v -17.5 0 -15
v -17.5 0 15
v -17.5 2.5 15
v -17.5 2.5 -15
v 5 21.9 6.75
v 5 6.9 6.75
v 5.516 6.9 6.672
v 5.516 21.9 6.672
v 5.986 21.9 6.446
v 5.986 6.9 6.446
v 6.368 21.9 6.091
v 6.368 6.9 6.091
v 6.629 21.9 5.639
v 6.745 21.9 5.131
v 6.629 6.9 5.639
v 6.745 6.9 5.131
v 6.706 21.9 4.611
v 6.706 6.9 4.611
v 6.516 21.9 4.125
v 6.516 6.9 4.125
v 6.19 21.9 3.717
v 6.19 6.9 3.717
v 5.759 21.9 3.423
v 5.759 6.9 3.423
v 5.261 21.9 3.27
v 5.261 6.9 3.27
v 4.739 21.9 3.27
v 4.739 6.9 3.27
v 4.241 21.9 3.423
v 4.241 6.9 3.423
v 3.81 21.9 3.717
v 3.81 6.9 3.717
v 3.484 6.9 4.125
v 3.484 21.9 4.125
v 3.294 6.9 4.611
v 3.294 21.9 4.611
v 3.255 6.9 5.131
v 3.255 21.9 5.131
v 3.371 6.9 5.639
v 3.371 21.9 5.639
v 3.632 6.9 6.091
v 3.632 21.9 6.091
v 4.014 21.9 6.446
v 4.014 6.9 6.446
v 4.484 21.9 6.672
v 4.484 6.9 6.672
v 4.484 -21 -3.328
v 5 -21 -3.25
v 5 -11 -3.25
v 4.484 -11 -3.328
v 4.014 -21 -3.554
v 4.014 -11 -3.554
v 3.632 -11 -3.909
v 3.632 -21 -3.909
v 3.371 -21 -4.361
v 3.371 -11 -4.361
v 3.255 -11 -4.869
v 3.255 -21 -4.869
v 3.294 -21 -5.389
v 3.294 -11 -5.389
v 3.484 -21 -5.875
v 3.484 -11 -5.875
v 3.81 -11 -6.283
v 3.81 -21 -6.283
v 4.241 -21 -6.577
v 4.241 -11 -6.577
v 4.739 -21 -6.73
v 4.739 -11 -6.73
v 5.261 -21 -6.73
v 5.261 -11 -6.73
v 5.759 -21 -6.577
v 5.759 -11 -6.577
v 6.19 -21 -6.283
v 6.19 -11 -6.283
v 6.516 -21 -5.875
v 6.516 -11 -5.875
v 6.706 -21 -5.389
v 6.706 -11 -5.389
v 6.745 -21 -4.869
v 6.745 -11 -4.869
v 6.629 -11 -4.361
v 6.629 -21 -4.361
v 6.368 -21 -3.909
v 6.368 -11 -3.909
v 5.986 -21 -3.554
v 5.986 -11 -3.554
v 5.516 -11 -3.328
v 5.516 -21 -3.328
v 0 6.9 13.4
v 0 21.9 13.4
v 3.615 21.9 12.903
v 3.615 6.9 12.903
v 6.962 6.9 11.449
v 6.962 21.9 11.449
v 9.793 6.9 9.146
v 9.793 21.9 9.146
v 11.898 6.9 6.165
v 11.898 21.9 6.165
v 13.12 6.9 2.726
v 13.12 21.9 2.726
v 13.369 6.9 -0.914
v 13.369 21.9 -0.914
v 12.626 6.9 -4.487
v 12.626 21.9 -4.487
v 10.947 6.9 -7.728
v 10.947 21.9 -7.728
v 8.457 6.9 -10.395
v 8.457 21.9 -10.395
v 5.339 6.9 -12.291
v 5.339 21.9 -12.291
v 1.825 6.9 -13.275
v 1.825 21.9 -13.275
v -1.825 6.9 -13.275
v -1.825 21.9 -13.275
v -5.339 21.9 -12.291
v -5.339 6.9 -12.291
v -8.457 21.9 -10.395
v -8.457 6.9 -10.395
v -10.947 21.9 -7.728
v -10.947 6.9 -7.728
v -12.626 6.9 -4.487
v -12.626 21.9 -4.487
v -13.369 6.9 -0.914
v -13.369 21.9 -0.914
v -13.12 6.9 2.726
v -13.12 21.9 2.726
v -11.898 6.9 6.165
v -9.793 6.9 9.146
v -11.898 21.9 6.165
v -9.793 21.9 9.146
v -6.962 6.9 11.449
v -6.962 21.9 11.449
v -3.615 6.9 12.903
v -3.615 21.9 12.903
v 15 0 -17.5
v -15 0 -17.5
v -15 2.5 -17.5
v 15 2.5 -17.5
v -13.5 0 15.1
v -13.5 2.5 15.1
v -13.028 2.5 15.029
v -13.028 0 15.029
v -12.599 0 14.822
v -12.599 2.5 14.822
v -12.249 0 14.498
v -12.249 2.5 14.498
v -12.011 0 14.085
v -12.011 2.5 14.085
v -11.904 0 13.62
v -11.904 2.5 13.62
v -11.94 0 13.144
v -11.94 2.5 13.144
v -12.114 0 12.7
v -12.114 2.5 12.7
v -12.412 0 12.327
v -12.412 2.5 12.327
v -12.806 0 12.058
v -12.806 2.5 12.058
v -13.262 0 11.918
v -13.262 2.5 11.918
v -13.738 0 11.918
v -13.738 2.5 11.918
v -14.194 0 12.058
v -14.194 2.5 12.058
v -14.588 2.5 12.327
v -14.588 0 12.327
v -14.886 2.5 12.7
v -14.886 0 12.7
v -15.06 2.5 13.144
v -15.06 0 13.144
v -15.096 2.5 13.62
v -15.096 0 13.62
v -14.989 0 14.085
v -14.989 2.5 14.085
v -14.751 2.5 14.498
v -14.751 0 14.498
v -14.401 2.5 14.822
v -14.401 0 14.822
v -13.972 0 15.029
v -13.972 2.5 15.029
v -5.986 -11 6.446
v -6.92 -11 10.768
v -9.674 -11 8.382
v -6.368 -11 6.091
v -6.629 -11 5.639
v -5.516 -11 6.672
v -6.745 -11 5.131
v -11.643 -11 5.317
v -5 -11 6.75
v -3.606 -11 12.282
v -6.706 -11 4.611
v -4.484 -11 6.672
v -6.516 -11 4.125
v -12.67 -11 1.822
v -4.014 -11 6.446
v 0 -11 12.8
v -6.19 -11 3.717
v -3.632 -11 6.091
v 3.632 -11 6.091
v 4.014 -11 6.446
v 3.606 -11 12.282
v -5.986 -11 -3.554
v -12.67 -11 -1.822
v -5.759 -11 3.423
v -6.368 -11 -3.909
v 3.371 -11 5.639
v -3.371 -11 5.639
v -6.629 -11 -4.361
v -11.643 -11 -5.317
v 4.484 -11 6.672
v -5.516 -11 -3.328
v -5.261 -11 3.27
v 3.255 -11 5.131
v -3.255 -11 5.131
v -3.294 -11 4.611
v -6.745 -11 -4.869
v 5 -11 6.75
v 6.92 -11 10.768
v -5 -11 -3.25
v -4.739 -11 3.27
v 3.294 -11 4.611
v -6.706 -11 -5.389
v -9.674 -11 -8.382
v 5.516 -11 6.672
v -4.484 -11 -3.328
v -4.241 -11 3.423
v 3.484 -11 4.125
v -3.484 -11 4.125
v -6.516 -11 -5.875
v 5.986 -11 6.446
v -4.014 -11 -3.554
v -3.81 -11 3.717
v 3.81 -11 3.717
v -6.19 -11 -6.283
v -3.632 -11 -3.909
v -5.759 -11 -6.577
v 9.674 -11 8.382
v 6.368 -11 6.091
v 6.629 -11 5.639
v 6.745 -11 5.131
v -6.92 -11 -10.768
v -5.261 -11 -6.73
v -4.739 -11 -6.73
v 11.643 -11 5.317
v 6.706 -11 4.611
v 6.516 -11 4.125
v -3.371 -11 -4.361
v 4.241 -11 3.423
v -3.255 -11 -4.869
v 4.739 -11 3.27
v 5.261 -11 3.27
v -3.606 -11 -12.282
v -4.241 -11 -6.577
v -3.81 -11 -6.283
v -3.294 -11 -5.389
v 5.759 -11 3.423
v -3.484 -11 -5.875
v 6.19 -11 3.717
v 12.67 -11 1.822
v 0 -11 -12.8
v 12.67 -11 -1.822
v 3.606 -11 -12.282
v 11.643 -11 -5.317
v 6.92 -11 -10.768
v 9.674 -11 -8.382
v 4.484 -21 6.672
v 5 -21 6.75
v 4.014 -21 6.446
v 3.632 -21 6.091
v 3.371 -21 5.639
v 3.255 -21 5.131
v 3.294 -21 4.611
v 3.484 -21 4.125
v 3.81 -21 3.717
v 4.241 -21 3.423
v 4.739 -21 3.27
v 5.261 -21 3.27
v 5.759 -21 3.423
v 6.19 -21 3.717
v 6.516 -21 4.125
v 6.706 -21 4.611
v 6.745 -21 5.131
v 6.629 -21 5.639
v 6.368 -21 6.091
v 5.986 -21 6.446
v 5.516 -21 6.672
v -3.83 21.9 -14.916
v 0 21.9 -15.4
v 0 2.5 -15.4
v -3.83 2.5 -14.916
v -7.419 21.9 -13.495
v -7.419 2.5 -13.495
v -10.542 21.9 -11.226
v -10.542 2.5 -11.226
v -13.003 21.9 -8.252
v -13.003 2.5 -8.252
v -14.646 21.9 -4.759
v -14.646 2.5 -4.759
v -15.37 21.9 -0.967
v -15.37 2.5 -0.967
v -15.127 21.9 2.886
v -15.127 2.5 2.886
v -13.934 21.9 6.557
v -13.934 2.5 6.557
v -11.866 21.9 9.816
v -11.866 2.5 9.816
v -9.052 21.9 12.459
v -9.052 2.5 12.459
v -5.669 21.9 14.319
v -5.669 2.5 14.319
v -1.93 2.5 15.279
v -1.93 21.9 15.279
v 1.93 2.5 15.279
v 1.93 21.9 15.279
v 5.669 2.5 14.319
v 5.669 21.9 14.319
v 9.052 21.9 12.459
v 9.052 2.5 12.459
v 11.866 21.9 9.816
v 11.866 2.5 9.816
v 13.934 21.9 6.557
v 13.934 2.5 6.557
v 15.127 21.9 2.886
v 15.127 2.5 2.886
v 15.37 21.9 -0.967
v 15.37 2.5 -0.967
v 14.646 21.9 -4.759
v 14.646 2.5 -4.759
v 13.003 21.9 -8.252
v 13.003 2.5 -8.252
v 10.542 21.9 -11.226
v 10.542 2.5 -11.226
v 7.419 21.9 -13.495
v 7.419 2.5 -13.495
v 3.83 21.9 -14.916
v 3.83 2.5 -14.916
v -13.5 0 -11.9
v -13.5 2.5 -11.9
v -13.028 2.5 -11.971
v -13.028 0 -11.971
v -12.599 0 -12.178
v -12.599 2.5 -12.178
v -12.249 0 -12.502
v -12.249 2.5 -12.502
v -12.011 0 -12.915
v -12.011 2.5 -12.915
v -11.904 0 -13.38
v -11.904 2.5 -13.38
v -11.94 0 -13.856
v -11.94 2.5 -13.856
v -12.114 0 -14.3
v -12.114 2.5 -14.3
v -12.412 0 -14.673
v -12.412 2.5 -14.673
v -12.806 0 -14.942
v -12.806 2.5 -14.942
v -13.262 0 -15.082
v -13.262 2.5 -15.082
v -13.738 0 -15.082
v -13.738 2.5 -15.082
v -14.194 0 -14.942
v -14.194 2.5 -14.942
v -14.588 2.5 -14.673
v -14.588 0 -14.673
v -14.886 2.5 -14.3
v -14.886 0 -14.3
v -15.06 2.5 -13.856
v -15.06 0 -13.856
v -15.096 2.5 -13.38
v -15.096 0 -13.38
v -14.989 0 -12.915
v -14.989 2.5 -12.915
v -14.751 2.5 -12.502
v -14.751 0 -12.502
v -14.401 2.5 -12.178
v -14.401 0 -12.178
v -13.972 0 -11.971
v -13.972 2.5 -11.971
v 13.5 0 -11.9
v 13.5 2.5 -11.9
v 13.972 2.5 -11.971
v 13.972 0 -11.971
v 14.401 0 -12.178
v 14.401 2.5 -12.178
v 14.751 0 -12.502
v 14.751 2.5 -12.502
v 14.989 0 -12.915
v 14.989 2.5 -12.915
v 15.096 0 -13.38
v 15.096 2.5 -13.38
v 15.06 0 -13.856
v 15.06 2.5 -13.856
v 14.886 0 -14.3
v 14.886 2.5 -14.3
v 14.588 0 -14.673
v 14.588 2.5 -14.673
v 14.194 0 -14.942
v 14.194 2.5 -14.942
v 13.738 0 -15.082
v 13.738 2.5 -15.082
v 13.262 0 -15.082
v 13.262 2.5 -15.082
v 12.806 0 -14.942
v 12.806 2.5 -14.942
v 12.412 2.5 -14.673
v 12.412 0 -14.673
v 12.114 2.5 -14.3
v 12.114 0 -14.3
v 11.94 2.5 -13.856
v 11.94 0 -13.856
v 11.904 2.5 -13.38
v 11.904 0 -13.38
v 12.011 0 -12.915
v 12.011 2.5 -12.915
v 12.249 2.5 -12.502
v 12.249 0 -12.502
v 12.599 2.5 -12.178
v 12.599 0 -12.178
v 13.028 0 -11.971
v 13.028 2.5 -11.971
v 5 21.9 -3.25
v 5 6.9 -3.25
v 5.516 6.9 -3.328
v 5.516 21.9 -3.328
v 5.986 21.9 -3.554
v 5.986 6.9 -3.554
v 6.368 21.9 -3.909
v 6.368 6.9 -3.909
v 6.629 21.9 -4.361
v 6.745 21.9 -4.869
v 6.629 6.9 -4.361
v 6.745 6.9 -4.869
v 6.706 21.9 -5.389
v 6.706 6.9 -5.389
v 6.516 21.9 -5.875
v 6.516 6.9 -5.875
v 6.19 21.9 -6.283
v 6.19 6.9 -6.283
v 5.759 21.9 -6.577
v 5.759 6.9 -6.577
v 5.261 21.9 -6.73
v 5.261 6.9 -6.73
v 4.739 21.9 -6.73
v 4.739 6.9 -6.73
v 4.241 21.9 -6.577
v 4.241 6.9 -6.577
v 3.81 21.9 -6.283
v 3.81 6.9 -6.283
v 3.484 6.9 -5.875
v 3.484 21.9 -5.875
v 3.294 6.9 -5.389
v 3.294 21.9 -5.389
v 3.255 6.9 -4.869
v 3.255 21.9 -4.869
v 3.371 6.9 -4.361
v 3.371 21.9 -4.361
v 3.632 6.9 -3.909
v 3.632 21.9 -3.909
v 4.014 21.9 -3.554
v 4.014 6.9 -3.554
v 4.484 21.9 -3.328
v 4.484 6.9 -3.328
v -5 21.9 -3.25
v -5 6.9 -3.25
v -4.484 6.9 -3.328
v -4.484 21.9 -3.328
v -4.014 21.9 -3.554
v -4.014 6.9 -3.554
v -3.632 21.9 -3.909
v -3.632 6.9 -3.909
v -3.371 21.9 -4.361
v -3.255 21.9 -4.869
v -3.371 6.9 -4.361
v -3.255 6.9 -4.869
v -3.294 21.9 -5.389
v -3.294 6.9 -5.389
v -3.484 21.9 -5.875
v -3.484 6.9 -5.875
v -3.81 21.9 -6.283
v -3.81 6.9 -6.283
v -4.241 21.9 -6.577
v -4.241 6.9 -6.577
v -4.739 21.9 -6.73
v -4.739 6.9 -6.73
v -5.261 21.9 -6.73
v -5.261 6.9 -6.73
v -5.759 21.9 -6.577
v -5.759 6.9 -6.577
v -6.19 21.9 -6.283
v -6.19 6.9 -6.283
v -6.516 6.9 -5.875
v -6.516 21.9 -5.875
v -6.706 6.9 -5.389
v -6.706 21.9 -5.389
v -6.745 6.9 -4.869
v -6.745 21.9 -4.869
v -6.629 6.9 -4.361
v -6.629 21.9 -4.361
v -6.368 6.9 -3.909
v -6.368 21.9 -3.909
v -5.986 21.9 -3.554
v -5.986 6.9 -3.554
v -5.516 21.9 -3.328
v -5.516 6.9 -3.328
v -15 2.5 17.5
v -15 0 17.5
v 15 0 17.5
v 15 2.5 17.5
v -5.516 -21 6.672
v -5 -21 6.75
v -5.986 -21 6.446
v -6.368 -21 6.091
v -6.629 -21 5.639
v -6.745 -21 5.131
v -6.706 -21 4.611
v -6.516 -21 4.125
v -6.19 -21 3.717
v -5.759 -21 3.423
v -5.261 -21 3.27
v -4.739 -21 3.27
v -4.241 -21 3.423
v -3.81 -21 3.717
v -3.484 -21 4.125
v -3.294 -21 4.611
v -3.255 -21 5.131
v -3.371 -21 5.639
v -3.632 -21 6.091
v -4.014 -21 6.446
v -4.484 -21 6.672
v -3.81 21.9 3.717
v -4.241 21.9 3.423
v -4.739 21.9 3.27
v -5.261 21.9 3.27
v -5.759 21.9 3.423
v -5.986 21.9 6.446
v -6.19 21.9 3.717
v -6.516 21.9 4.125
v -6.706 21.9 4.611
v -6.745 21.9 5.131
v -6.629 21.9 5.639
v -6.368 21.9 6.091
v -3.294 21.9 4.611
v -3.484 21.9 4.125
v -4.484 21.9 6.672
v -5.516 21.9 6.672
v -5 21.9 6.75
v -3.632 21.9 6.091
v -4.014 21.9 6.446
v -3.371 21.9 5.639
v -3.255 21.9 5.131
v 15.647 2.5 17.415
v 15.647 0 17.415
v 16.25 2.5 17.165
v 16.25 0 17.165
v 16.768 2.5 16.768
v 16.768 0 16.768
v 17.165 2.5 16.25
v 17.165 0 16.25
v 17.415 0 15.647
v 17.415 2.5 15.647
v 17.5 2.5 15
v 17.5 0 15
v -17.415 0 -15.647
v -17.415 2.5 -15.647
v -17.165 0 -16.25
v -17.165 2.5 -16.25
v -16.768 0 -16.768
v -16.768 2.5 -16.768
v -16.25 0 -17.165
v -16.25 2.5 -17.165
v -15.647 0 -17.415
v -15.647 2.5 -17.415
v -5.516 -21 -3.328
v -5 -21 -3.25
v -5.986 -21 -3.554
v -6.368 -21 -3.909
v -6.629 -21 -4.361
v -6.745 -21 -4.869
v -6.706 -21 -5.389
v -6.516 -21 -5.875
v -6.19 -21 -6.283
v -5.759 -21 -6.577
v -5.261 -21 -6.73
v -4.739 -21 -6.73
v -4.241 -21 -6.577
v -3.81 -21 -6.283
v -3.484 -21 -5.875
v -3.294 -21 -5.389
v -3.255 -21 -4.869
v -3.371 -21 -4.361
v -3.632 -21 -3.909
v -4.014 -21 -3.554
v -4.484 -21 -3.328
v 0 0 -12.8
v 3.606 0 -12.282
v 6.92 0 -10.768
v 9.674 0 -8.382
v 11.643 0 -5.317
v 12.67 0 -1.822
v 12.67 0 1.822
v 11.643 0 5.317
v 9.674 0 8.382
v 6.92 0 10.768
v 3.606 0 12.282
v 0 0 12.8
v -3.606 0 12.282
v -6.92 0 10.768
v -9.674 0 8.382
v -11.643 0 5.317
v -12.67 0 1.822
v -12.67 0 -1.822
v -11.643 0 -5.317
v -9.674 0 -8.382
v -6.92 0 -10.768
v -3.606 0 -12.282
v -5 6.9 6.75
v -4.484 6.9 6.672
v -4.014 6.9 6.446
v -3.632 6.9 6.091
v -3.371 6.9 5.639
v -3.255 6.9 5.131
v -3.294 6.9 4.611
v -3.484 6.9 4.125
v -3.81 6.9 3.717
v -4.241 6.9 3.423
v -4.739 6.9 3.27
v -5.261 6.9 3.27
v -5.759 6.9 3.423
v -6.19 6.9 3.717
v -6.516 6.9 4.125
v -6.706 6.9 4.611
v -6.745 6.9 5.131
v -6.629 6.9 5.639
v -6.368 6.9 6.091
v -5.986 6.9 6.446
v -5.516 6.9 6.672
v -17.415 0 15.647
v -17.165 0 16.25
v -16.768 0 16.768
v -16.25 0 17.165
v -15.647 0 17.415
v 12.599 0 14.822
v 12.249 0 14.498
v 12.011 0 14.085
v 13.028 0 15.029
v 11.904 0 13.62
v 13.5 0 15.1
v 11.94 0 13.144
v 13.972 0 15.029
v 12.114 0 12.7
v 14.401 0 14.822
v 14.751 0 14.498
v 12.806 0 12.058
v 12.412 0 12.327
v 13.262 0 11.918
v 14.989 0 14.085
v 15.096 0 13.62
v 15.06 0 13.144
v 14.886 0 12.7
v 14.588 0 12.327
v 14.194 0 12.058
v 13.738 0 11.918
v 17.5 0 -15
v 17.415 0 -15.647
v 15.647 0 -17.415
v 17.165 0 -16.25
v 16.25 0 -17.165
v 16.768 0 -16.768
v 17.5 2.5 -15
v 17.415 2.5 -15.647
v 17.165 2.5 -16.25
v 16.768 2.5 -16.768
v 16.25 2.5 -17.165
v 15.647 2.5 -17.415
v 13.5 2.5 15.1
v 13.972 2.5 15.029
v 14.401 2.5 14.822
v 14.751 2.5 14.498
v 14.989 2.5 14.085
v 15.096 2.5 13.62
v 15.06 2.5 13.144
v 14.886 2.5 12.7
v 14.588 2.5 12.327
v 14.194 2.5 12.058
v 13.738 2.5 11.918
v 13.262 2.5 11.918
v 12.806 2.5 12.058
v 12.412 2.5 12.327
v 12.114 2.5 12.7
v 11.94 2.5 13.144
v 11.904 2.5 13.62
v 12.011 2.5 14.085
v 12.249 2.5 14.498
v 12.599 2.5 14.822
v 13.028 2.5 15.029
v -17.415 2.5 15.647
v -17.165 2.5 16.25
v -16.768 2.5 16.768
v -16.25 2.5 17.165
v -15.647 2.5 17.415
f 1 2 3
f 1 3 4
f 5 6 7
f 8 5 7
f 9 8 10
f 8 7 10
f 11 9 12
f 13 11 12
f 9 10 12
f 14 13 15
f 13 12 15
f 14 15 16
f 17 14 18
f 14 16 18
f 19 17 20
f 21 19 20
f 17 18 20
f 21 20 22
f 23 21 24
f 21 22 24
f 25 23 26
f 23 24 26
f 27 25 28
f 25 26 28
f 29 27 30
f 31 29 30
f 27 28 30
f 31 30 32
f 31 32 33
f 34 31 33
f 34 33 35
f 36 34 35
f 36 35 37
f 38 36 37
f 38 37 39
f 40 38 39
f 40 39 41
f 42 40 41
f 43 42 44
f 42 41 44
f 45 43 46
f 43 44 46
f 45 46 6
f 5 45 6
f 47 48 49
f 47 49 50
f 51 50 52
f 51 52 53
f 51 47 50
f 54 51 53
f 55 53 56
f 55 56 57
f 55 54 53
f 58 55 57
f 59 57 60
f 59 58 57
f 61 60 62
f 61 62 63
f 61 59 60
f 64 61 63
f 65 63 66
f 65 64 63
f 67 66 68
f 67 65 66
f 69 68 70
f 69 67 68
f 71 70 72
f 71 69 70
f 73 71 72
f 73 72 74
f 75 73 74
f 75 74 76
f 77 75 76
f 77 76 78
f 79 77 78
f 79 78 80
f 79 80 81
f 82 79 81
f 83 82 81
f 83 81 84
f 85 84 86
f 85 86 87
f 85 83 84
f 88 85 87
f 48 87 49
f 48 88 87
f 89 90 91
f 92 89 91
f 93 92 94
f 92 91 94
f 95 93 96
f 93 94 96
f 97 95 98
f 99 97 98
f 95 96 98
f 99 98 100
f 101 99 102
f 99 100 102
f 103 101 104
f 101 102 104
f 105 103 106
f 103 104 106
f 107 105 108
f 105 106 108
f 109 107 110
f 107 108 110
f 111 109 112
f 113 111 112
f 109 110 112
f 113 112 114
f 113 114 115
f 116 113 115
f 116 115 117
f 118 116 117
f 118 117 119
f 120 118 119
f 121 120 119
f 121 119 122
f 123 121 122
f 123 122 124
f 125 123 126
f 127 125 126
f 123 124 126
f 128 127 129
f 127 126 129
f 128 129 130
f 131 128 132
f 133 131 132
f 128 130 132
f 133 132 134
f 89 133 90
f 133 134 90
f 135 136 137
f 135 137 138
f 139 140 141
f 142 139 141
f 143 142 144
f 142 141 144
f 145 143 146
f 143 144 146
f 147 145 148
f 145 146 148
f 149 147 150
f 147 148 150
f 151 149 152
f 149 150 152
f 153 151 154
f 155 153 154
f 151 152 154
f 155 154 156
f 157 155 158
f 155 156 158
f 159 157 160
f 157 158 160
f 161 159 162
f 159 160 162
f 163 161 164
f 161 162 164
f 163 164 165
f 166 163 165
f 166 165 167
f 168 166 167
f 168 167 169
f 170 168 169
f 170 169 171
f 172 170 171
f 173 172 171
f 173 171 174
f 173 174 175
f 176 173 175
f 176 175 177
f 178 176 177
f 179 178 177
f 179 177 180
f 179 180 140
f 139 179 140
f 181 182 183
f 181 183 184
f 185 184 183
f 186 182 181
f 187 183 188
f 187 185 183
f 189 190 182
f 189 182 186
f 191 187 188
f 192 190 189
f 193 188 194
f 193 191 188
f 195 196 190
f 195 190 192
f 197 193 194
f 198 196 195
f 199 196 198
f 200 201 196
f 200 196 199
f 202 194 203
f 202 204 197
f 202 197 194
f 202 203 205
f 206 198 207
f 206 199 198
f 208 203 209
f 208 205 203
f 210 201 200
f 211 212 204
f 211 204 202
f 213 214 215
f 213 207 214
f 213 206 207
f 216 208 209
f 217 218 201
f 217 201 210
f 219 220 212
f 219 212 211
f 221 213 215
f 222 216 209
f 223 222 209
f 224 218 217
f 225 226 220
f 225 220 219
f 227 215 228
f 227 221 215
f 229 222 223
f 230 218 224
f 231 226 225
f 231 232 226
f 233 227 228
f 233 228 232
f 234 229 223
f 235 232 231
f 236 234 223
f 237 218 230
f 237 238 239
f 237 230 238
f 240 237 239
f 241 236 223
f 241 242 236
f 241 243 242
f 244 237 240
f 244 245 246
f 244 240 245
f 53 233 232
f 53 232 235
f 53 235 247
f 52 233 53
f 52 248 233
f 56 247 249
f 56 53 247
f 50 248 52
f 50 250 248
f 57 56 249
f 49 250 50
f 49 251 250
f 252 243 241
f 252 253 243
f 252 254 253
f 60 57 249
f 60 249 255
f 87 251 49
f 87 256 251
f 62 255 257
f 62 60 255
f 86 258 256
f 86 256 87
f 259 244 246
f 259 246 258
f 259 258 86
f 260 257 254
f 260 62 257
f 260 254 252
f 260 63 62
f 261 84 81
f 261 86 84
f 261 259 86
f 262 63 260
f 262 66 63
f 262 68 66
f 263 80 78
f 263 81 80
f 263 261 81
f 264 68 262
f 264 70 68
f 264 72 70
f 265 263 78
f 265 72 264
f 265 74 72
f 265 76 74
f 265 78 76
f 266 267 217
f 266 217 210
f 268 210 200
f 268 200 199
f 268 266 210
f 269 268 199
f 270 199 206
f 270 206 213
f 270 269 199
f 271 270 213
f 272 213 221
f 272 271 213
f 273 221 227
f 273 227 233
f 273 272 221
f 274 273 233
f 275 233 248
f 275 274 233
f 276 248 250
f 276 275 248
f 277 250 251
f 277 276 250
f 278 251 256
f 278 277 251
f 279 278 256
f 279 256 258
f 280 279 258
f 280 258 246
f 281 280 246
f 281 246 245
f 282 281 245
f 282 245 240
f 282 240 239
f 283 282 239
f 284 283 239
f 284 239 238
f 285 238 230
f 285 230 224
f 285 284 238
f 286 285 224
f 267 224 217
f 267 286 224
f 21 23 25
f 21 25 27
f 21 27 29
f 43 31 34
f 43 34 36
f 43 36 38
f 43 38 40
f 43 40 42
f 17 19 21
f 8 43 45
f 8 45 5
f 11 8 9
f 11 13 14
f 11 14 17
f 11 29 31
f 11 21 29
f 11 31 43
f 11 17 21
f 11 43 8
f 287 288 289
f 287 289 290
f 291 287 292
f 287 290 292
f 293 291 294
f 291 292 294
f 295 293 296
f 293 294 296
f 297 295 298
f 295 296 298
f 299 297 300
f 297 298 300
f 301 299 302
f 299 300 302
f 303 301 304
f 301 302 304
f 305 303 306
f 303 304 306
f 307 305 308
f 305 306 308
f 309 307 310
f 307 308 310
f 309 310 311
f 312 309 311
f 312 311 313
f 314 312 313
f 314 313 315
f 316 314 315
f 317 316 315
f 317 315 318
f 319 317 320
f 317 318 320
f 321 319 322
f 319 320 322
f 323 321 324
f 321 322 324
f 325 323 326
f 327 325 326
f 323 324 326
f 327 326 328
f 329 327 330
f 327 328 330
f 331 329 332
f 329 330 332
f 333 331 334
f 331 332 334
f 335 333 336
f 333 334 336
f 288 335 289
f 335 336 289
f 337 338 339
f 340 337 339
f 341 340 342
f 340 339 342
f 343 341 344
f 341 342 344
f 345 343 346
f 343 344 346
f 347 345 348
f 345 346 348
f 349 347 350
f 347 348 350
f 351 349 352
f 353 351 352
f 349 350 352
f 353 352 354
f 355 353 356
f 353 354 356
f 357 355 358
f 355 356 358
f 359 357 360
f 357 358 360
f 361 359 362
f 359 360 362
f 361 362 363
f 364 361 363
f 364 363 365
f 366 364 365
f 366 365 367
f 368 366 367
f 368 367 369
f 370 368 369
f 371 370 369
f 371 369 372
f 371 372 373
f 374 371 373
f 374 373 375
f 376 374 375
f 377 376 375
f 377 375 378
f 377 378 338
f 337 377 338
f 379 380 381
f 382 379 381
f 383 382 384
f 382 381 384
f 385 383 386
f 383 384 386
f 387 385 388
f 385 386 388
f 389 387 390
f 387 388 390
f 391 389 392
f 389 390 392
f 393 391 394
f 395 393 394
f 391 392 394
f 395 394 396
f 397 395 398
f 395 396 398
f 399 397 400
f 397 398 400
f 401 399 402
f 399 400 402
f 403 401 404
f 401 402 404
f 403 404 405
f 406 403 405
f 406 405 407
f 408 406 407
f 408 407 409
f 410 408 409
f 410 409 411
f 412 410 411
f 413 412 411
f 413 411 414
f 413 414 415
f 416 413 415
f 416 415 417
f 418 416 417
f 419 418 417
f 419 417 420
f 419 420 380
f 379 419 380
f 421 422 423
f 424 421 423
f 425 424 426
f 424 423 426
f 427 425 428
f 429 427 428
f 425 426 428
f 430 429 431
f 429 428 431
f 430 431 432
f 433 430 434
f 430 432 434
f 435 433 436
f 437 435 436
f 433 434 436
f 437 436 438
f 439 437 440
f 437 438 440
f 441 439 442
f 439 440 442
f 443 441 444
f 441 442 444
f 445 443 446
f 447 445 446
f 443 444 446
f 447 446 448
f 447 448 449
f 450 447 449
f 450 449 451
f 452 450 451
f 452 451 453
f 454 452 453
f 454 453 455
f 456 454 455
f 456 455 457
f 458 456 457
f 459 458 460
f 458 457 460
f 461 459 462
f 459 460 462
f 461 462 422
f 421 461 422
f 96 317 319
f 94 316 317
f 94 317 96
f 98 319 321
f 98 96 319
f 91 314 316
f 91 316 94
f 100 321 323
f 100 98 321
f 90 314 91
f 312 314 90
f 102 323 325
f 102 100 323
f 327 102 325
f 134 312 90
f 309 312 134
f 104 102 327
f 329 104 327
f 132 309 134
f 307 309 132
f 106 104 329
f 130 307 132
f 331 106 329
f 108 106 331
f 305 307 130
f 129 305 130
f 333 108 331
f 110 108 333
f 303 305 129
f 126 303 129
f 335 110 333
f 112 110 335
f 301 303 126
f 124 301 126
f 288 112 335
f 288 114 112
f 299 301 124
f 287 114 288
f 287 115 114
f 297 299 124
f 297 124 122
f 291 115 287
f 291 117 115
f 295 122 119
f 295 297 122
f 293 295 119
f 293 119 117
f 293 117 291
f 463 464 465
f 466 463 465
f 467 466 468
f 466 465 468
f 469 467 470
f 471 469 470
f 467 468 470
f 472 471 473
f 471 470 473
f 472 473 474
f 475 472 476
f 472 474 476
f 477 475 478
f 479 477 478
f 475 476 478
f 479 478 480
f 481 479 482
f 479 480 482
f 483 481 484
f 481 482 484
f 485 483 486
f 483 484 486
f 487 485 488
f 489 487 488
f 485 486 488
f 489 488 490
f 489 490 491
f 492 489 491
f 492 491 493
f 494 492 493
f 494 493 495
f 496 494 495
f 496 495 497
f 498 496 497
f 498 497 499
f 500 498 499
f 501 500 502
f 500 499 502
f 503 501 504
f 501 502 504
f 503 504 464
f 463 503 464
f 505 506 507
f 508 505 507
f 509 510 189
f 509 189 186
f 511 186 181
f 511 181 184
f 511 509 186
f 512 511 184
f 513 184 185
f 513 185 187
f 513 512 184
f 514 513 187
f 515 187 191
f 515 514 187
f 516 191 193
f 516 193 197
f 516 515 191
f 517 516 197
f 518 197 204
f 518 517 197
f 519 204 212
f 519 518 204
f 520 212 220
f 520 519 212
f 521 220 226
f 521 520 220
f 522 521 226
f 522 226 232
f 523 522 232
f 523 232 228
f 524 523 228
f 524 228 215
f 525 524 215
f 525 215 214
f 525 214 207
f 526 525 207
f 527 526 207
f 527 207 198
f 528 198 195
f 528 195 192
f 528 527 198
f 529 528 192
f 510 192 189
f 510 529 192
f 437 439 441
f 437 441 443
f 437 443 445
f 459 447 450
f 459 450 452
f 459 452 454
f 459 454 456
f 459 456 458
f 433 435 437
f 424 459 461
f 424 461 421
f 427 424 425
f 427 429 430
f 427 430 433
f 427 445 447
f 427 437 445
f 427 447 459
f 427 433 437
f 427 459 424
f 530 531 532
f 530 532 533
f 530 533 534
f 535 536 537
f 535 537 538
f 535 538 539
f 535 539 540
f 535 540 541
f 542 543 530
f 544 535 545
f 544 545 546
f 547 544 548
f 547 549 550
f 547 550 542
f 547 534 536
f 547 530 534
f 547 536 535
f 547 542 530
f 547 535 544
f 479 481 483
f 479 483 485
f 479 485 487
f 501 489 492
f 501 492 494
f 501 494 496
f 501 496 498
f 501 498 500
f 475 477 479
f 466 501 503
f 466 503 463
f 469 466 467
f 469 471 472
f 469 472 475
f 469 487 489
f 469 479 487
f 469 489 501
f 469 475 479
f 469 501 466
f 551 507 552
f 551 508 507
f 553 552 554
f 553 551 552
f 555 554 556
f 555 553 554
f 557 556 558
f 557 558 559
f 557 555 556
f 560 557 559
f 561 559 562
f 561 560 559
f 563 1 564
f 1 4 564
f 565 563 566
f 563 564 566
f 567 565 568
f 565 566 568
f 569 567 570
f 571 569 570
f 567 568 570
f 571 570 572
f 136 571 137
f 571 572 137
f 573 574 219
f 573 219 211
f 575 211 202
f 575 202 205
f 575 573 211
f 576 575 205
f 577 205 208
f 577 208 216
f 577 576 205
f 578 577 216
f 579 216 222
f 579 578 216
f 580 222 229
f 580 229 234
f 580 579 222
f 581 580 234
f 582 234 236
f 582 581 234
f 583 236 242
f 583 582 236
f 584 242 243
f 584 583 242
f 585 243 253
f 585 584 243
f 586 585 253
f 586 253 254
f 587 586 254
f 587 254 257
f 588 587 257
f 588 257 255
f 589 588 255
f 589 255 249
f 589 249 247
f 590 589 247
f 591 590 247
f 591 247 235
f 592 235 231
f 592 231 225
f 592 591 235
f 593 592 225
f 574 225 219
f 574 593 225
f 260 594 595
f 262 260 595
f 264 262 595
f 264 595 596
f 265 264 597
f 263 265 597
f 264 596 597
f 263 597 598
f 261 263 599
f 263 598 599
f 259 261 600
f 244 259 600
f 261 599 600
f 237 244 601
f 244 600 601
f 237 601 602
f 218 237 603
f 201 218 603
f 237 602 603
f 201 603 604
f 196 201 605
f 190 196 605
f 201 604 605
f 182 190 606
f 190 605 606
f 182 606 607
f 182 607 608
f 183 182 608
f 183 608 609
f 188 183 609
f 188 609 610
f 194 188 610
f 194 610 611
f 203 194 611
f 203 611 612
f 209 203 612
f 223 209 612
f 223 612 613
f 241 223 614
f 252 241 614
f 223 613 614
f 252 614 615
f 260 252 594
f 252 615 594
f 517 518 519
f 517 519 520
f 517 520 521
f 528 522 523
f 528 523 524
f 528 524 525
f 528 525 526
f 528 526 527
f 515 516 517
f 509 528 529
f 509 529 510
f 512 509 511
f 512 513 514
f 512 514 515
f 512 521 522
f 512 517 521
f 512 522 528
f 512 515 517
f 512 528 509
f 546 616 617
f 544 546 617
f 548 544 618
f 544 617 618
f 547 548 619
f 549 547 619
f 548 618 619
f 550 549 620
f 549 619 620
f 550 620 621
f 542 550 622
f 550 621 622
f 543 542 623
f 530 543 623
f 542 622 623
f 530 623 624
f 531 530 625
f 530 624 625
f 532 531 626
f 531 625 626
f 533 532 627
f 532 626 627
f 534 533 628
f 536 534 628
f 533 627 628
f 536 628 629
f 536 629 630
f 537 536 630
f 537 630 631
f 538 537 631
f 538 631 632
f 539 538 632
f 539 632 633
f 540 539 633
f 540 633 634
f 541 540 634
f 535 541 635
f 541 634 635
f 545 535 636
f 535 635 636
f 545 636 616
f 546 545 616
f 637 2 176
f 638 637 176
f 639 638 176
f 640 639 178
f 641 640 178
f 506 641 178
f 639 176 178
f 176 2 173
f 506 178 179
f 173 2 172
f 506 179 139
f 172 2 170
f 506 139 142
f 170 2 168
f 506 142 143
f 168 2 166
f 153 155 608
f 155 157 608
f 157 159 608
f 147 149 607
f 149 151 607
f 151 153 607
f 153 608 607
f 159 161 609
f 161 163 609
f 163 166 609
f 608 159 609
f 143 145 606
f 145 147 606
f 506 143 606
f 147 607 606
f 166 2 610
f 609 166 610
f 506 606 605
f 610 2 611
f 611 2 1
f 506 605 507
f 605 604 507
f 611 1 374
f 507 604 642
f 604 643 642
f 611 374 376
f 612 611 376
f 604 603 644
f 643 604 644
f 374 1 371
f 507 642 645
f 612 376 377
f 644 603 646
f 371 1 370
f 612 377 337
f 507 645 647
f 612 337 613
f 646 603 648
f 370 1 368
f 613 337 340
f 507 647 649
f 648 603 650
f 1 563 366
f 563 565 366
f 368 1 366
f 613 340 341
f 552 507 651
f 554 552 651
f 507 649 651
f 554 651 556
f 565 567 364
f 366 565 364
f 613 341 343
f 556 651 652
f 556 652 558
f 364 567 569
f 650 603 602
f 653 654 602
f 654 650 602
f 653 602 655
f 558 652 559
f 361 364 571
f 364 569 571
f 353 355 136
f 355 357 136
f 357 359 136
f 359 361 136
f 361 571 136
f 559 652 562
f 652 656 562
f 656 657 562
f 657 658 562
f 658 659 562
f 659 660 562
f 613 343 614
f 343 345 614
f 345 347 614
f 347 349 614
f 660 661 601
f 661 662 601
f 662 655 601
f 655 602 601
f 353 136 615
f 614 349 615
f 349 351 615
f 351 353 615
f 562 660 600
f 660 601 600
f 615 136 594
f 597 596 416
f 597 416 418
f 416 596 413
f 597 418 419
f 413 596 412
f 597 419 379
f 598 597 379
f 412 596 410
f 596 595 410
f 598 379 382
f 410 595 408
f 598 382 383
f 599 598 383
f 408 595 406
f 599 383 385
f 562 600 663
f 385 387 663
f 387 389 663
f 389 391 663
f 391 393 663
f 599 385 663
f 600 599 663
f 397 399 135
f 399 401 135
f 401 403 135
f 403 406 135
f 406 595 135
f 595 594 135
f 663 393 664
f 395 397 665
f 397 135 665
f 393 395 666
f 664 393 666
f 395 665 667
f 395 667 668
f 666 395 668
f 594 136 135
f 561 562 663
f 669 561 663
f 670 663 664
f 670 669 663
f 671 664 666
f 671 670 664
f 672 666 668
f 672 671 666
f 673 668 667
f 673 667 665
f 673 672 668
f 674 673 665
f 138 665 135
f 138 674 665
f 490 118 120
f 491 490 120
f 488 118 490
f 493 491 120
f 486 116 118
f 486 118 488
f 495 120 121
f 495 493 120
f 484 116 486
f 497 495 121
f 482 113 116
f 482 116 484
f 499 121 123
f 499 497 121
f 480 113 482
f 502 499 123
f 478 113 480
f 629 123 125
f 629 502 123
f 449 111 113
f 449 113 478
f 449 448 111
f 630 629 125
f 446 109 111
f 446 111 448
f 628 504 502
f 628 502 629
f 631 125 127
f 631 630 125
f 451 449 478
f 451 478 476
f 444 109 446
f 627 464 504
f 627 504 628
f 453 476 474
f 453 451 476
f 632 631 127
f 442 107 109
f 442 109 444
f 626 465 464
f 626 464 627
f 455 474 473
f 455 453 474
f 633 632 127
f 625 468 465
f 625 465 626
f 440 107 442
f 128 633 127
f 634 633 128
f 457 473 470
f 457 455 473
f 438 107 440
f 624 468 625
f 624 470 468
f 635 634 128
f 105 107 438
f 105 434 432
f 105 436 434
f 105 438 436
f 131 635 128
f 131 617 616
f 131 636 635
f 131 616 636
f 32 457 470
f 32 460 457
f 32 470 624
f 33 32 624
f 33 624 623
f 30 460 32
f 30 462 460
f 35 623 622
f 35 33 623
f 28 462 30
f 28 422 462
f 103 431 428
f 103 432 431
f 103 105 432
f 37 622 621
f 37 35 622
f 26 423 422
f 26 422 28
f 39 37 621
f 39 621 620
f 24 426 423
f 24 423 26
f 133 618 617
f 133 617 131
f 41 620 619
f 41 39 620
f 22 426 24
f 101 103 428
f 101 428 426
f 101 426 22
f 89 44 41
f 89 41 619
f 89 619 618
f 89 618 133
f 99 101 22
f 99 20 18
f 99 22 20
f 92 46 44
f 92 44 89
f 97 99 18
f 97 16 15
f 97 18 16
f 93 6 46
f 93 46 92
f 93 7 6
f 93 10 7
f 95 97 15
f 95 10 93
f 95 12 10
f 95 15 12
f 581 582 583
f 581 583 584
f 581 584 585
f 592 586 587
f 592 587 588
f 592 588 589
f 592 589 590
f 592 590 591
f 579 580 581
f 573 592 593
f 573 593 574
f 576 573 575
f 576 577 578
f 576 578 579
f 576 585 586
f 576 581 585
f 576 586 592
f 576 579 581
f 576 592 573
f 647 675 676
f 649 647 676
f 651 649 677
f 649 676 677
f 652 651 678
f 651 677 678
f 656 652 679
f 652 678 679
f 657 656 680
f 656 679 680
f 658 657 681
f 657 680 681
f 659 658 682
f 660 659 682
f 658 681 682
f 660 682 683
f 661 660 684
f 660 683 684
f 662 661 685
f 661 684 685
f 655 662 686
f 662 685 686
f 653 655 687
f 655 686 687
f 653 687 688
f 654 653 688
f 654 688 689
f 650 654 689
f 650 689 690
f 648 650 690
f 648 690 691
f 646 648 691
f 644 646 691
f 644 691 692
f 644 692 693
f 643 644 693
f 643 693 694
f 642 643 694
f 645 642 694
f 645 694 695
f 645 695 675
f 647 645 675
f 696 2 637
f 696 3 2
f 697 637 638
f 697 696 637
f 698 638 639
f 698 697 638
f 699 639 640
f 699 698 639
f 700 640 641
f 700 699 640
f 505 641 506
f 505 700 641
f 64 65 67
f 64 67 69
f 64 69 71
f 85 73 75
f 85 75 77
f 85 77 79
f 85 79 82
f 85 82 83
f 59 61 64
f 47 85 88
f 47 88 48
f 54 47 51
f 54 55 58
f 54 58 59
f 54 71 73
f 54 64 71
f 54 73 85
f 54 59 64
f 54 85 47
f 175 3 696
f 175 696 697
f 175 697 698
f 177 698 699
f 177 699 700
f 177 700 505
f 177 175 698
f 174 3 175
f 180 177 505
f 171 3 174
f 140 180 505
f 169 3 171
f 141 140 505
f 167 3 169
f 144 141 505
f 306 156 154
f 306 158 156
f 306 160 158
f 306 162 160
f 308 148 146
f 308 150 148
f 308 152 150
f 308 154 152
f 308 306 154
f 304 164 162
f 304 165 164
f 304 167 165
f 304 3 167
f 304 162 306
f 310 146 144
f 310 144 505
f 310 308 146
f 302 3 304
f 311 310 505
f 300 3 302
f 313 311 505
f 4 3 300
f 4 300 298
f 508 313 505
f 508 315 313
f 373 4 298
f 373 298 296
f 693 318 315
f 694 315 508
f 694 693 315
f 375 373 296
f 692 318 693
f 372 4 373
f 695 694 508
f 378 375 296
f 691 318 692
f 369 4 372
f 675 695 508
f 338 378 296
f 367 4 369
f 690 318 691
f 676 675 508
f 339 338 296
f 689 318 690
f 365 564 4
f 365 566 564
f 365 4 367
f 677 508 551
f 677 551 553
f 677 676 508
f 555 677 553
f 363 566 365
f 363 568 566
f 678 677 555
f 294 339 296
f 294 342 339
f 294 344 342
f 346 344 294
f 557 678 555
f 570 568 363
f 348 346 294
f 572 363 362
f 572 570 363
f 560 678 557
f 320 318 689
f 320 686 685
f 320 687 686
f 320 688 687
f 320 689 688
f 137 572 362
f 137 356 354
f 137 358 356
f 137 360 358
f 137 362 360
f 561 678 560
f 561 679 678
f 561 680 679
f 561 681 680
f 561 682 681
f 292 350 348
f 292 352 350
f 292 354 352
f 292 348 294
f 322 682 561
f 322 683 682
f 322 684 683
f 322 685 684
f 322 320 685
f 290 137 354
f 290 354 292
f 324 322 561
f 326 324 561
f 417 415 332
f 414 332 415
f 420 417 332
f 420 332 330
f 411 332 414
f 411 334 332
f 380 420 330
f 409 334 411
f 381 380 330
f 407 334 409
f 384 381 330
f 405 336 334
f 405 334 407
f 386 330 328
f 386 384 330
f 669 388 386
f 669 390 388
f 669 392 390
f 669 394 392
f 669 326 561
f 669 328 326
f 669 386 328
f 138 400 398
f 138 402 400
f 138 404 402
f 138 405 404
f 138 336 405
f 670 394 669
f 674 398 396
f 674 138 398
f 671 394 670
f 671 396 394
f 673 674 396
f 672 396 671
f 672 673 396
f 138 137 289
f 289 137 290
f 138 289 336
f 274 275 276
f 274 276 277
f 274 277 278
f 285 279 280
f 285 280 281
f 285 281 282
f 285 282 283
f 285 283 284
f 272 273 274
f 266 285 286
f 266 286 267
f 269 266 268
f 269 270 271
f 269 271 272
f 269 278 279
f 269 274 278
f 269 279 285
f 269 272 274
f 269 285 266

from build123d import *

# Parameters (mm, degrees)
SKETCH1_W           = 35
SKETCH1_H           = 35
BOSS_EXTRUDE1_DEPTH = 2.5
FILLET1_R           = 2.5
SKETCH2_R           = 15.4
BOSS_EXTRUDE2_DEPTH = 19.4
SKETCH3_R           = 12.8
BOSS_EXTRUDE3_DEPTH = 11
SKETCH4_R           = 13.4
CUT_EXTRUDE1_DEPTH  = 15
SKETCH5_R           = 1.75
BOSS_EXTRUDE4_DEPTH = 15
BOSS_EXTRUDE5_START = 10
SKETCH6_R           = 1.75
BOSS_EXTRUDE5_DEPTH = 10
SKETCH7_R           = 1.6
CUT_EXTRUDE2_DEPTH  = 35.128433893


with BuildPart() as part:
    # Sketch1 → Boss-Extrude1 (new body)
    with BuildSketch(Plane(origin=(0, 0, 0), x_dir=(1, 0, 0), z_dir=(0, 1, 0))):
        Rectangle(SKETCH1_W, SKETCH1_H)
    extrude(amount=BOSS_EXTRUDE1_DEPTH)

    # Fillet1
    fillet1_edges = [part.edges().sort_by_distance(p)[0] for p in [
        (17.5, 1.25, 17.5),
        (-17.5, 1.25, 17.5),
        (-17.5, 1.25, -17.5),
        (17.5, 1.25, -17.5),
    ]]
    fillet(fillet1_edges, radius=FILLET1_R)

    # Sketch2 → Boss-Extrude2 (add)
    with BuildSketch(Plane(origin=(0, 2.5, 0), x_dir=(1, 0, 0), z_dir=(0, 1, 0))):
        with Locations(Location((0, 0, 0), (0, 0, 90))):
            Circle(SKETCH2_R)
    extrude(amount=BOSS_EXTRUDE2_DEPTH)

    # Sketch3 → Boss-Extrude3 (add)
    with BuildSketch(Plane.XZ):
        with Locations(Location((0, 0, 0), (0, 0, 270))):
            Circle(SKETCH3_R)
    extrude(amount=BOSS_EXTRUDE3_DEPTH)

    # Sketch4 → Cut-Extrude1 (cut)
    with BuildSketch(Plane(origin=(0, 21.9, 0), x_dir=(1, 0, 0), z_dir=(0, 1, 0))):
        with Locations(Location((0, 0, 0), (0, 0, 270))):
            Circle(SKETCH4_R)
    extrude(amount=-CUT_EXTRUDE1_DEPTH, mode=Mode.SUBTRACT)

    # Sketch5 → Boss-Extrude4 (add)
    with BuildSketch(Plane(origin=(0, 6.9, 0), x_dir=(1, 0, 0), z_dir=(0, 1, 0))):
        with Locations(Location((-5, 5, 0), (0, 0, 270))):
            Circle(SKETCH5_R)
        with Locations(Location((-5, -5, 0), (0, 0, 270))):
            Circle(SKETCH5_R)
        with Locations(Location((5, -5, 0), (0, 0, 270))):
            Circle(SKETCH5_R)
        with Locations(Location((5, 5, 0), (0, 0, 270))):
            Circle(SKETCH5_R)
    extrude(amount=BOSS_EXTRUDE4_DEPTH)

    # Sketch6 → Boss-Extrude5 (add)
    with BuildSketch(Plane.XZ.offset(11).offset(BOSS_EXTRUDE5_START)):
        with Locations(Location((5, -5, 0), (0, 0, 90))):
            Circle(SKETCH6_R)
        with Locations(Location((5, 5, 0), (0, 0, 90))):
            Circle(SKETCH6_R)
        with Locations(Location((-5, 5, 0), (0, 0, 90))):
            Circle(SKETCH6_R)
        with Locations(Location((-5, -5, 0), (0, 0, 90))):
            Circle(SKETCH6_R)
    extrude(amount=-BOSS_EXTRUDE5_DEPTH)

    # Sketch7 → Cut-Extrude2 (cut, through all)
    with BuildSketch(Plane(origin=(0, 2.5, 0), x_dir=(1, 0, 0), z_dir=(0, 1, 0))):
        with Locations(Location((-13.5, 13.5, 0), (0, 0, 270))):
            Circle(SKETCH7_R)
        with Locations(Location((-13.5, -13.5, 0), (0, 0, 270))):
            Circle(SKETCH7_R)
        with Locations(Location((13.5, -13.5, 0), (0, 0, 270))):
            Circle(SKETCH7_R)
        with Locations(Location((13.5, 13.5, 0), (0, 0, 270))):
            Circle(SKETCH7_R)
    extrude(amount=-CUT_EXTRUDE2_DEPTH, mode=Mode.SUBTRACT)


solid = part.part
